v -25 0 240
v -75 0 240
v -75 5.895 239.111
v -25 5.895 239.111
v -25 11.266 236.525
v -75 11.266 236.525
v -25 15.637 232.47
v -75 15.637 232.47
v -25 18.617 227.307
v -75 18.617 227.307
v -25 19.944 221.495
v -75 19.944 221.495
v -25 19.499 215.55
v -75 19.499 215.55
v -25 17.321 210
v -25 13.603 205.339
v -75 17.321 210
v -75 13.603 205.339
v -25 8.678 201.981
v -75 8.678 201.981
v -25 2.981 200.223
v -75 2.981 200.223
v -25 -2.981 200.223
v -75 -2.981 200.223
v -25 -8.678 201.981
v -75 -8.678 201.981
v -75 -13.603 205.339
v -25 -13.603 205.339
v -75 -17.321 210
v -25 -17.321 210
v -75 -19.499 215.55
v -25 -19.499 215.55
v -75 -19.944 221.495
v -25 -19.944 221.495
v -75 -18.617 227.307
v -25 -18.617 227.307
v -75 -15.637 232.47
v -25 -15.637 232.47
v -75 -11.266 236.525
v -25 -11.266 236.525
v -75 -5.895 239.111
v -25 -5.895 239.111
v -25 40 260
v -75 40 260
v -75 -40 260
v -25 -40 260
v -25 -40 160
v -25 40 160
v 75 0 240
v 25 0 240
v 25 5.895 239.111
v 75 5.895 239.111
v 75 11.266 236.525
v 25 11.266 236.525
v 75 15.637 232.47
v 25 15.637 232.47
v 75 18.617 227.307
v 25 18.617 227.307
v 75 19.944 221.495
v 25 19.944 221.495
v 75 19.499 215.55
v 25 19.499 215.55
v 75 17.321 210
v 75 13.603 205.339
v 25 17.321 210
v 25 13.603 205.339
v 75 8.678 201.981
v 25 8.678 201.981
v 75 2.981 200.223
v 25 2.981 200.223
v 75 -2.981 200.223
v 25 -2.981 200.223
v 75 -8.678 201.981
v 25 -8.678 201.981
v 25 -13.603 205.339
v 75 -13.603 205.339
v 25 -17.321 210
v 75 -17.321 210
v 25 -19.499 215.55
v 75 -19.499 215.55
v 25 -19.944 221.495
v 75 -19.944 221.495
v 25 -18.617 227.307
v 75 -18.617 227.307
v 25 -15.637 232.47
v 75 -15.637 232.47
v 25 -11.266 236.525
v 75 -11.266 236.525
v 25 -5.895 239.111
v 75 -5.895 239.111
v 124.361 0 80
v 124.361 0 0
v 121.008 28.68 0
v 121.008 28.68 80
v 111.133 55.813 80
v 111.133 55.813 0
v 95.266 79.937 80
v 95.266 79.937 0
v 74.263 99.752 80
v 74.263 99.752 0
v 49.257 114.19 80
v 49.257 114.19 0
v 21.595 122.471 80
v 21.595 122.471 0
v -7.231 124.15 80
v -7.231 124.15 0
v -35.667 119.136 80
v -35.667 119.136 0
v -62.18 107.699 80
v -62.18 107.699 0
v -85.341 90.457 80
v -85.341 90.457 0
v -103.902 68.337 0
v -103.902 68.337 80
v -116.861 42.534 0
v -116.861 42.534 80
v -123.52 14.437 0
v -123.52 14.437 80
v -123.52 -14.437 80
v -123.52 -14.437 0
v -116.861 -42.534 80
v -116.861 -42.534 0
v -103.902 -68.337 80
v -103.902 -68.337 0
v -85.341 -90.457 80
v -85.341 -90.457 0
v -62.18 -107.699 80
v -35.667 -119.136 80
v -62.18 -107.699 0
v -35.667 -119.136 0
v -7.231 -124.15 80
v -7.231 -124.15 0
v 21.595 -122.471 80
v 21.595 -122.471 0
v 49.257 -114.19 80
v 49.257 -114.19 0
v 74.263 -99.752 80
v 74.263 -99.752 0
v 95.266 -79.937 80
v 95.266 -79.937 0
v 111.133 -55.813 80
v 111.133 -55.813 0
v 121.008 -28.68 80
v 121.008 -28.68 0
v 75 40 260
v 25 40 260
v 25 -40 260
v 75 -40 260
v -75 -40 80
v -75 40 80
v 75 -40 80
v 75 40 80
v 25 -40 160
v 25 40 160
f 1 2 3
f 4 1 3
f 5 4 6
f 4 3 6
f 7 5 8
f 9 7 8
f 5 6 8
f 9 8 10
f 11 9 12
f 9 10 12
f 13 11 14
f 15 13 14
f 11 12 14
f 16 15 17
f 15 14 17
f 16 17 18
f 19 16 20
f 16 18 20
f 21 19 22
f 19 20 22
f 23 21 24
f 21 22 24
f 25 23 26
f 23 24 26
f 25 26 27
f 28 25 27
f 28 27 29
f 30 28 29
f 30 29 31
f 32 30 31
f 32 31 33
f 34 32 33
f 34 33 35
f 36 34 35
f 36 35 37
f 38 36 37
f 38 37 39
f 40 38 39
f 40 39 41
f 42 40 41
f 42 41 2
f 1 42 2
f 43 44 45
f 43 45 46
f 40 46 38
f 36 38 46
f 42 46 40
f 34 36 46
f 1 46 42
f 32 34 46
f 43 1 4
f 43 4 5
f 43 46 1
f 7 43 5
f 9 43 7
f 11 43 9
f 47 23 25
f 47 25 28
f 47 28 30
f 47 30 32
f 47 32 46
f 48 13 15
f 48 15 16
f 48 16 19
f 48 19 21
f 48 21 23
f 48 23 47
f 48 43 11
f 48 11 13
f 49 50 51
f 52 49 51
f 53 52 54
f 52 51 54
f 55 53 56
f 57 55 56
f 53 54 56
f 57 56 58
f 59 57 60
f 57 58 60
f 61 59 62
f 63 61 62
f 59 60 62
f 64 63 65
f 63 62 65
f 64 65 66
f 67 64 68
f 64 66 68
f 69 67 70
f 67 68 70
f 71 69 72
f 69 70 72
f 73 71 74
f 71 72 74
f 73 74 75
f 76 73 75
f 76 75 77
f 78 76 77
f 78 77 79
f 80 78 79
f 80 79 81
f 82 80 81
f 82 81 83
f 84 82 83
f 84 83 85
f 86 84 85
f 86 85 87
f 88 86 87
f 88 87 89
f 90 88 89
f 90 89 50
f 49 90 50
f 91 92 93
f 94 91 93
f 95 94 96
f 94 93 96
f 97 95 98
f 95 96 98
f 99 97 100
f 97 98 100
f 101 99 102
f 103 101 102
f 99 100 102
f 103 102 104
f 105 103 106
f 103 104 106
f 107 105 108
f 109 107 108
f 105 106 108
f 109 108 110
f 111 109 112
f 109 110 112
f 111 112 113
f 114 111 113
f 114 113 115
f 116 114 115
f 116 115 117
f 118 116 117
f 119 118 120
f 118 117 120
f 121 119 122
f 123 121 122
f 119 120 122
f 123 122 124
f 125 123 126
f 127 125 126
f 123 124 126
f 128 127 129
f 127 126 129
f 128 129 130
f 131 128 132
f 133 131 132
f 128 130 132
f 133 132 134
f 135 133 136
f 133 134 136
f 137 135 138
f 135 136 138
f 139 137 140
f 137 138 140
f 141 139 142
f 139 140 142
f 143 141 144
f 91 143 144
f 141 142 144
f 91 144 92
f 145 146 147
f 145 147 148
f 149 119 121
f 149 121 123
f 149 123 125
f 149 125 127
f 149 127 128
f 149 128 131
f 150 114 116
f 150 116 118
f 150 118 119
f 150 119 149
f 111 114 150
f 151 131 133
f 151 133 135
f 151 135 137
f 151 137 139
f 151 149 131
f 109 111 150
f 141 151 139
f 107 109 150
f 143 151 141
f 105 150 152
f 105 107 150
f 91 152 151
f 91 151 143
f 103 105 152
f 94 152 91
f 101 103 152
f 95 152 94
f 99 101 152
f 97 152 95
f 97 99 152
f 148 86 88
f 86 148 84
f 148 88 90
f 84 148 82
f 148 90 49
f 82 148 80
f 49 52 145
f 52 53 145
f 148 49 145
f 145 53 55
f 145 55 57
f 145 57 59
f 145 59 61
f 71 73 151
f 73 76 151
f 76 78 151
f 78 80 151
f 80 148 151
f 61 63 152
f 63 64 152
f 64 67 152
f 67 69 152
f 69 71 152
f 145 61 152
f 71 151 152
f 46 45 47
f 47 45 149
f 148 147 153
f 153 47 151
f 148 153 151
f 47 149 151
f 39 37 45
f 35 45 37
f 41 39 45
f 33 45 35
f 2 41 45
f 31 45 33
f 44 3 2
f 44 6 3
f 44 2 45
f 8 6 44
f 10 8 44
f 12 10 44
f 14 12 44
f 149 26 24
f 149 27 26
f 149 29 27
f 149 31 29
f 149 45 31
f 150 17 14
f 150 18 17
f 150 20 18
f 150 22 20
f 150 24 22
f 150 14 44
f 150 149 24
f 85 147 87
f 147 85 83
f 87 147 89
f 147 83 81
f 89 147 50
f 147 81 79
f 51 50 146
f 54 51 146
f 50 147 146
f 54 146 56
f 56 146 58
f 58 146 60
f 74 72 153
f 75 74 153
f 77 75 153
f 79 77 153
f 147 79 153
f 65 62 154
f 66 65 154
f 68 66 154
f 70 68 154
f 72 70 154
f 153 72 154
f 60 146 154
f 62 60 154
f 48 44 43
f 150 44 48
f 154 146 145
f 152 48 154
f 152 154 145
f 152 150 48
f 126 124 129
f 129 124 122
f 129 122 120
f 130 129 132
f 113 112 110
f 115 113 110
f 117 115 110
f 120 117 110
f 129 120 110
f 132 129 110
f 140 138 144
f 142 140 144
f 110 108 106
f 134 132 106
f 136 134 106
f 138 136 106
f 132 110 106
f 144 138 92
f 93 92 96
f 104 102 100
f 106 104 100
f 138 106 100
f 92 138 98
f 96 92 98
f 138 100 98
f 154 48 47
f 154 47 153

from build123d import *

# Parameters (mm, degrees)
SKETCH3_R           = 124.360538227
BOSS_EXTRUDE2_DEPTH = 80
SKETCH4_W           = 150
SKETCH4_H           = 80
BOSS_EXTRUDE4_DEPTH = 260
SKETCH5_R           = 20
CUT_EXTRUDE1_DEPTH  = 260
SKETCH6_W           = 50
SKETCH6_H           = 100
CUT_EXTRUDE2_DEPTH  = 260


with BuildPart() as part:
    # Sketch3 → Boss-Extrude2 (new body)
    with BuildSketch(Plane.XY):
        Circle(SKETCH3_R)
    extrude(amount=BOSS_EXTRUDE2_DEPTH)

    # Sketch4 → Boss-Extrude4 (add)
    with BuildSketch(Plane.XY):
        Rectangle(SKETCH4_W, SKETCH4_H)
    extrude(amount=BOSS_EXTRUDE4_DEPTH)

    # Sketch5 → Cut-Extrude1 (cut)
    with BuildSketch(Plane.ZY.offset(75)):
        with Locations((220, 0)):
            Circle(SKETCH5_R)
    extrude(amount=-CUT_EXTRUDE1_DEPTH, mode=Mode.SUBTRACT)

    # Sketch6 → Cut-Extrude2 (cut)
    with BuildSketch(Plane(origin=(0, 40, 0), x_dir=(1, 0, 0), z_dir=(0, 1, 0))):
        with Locations((0, -210)):
            Rectangle(SKETCH6_W, SKETCH6_H)
    extrude(amount=-CUT_EXTRUDE2_DEPTH, mode=Mode.SUBTRACT)


solid = part.part
